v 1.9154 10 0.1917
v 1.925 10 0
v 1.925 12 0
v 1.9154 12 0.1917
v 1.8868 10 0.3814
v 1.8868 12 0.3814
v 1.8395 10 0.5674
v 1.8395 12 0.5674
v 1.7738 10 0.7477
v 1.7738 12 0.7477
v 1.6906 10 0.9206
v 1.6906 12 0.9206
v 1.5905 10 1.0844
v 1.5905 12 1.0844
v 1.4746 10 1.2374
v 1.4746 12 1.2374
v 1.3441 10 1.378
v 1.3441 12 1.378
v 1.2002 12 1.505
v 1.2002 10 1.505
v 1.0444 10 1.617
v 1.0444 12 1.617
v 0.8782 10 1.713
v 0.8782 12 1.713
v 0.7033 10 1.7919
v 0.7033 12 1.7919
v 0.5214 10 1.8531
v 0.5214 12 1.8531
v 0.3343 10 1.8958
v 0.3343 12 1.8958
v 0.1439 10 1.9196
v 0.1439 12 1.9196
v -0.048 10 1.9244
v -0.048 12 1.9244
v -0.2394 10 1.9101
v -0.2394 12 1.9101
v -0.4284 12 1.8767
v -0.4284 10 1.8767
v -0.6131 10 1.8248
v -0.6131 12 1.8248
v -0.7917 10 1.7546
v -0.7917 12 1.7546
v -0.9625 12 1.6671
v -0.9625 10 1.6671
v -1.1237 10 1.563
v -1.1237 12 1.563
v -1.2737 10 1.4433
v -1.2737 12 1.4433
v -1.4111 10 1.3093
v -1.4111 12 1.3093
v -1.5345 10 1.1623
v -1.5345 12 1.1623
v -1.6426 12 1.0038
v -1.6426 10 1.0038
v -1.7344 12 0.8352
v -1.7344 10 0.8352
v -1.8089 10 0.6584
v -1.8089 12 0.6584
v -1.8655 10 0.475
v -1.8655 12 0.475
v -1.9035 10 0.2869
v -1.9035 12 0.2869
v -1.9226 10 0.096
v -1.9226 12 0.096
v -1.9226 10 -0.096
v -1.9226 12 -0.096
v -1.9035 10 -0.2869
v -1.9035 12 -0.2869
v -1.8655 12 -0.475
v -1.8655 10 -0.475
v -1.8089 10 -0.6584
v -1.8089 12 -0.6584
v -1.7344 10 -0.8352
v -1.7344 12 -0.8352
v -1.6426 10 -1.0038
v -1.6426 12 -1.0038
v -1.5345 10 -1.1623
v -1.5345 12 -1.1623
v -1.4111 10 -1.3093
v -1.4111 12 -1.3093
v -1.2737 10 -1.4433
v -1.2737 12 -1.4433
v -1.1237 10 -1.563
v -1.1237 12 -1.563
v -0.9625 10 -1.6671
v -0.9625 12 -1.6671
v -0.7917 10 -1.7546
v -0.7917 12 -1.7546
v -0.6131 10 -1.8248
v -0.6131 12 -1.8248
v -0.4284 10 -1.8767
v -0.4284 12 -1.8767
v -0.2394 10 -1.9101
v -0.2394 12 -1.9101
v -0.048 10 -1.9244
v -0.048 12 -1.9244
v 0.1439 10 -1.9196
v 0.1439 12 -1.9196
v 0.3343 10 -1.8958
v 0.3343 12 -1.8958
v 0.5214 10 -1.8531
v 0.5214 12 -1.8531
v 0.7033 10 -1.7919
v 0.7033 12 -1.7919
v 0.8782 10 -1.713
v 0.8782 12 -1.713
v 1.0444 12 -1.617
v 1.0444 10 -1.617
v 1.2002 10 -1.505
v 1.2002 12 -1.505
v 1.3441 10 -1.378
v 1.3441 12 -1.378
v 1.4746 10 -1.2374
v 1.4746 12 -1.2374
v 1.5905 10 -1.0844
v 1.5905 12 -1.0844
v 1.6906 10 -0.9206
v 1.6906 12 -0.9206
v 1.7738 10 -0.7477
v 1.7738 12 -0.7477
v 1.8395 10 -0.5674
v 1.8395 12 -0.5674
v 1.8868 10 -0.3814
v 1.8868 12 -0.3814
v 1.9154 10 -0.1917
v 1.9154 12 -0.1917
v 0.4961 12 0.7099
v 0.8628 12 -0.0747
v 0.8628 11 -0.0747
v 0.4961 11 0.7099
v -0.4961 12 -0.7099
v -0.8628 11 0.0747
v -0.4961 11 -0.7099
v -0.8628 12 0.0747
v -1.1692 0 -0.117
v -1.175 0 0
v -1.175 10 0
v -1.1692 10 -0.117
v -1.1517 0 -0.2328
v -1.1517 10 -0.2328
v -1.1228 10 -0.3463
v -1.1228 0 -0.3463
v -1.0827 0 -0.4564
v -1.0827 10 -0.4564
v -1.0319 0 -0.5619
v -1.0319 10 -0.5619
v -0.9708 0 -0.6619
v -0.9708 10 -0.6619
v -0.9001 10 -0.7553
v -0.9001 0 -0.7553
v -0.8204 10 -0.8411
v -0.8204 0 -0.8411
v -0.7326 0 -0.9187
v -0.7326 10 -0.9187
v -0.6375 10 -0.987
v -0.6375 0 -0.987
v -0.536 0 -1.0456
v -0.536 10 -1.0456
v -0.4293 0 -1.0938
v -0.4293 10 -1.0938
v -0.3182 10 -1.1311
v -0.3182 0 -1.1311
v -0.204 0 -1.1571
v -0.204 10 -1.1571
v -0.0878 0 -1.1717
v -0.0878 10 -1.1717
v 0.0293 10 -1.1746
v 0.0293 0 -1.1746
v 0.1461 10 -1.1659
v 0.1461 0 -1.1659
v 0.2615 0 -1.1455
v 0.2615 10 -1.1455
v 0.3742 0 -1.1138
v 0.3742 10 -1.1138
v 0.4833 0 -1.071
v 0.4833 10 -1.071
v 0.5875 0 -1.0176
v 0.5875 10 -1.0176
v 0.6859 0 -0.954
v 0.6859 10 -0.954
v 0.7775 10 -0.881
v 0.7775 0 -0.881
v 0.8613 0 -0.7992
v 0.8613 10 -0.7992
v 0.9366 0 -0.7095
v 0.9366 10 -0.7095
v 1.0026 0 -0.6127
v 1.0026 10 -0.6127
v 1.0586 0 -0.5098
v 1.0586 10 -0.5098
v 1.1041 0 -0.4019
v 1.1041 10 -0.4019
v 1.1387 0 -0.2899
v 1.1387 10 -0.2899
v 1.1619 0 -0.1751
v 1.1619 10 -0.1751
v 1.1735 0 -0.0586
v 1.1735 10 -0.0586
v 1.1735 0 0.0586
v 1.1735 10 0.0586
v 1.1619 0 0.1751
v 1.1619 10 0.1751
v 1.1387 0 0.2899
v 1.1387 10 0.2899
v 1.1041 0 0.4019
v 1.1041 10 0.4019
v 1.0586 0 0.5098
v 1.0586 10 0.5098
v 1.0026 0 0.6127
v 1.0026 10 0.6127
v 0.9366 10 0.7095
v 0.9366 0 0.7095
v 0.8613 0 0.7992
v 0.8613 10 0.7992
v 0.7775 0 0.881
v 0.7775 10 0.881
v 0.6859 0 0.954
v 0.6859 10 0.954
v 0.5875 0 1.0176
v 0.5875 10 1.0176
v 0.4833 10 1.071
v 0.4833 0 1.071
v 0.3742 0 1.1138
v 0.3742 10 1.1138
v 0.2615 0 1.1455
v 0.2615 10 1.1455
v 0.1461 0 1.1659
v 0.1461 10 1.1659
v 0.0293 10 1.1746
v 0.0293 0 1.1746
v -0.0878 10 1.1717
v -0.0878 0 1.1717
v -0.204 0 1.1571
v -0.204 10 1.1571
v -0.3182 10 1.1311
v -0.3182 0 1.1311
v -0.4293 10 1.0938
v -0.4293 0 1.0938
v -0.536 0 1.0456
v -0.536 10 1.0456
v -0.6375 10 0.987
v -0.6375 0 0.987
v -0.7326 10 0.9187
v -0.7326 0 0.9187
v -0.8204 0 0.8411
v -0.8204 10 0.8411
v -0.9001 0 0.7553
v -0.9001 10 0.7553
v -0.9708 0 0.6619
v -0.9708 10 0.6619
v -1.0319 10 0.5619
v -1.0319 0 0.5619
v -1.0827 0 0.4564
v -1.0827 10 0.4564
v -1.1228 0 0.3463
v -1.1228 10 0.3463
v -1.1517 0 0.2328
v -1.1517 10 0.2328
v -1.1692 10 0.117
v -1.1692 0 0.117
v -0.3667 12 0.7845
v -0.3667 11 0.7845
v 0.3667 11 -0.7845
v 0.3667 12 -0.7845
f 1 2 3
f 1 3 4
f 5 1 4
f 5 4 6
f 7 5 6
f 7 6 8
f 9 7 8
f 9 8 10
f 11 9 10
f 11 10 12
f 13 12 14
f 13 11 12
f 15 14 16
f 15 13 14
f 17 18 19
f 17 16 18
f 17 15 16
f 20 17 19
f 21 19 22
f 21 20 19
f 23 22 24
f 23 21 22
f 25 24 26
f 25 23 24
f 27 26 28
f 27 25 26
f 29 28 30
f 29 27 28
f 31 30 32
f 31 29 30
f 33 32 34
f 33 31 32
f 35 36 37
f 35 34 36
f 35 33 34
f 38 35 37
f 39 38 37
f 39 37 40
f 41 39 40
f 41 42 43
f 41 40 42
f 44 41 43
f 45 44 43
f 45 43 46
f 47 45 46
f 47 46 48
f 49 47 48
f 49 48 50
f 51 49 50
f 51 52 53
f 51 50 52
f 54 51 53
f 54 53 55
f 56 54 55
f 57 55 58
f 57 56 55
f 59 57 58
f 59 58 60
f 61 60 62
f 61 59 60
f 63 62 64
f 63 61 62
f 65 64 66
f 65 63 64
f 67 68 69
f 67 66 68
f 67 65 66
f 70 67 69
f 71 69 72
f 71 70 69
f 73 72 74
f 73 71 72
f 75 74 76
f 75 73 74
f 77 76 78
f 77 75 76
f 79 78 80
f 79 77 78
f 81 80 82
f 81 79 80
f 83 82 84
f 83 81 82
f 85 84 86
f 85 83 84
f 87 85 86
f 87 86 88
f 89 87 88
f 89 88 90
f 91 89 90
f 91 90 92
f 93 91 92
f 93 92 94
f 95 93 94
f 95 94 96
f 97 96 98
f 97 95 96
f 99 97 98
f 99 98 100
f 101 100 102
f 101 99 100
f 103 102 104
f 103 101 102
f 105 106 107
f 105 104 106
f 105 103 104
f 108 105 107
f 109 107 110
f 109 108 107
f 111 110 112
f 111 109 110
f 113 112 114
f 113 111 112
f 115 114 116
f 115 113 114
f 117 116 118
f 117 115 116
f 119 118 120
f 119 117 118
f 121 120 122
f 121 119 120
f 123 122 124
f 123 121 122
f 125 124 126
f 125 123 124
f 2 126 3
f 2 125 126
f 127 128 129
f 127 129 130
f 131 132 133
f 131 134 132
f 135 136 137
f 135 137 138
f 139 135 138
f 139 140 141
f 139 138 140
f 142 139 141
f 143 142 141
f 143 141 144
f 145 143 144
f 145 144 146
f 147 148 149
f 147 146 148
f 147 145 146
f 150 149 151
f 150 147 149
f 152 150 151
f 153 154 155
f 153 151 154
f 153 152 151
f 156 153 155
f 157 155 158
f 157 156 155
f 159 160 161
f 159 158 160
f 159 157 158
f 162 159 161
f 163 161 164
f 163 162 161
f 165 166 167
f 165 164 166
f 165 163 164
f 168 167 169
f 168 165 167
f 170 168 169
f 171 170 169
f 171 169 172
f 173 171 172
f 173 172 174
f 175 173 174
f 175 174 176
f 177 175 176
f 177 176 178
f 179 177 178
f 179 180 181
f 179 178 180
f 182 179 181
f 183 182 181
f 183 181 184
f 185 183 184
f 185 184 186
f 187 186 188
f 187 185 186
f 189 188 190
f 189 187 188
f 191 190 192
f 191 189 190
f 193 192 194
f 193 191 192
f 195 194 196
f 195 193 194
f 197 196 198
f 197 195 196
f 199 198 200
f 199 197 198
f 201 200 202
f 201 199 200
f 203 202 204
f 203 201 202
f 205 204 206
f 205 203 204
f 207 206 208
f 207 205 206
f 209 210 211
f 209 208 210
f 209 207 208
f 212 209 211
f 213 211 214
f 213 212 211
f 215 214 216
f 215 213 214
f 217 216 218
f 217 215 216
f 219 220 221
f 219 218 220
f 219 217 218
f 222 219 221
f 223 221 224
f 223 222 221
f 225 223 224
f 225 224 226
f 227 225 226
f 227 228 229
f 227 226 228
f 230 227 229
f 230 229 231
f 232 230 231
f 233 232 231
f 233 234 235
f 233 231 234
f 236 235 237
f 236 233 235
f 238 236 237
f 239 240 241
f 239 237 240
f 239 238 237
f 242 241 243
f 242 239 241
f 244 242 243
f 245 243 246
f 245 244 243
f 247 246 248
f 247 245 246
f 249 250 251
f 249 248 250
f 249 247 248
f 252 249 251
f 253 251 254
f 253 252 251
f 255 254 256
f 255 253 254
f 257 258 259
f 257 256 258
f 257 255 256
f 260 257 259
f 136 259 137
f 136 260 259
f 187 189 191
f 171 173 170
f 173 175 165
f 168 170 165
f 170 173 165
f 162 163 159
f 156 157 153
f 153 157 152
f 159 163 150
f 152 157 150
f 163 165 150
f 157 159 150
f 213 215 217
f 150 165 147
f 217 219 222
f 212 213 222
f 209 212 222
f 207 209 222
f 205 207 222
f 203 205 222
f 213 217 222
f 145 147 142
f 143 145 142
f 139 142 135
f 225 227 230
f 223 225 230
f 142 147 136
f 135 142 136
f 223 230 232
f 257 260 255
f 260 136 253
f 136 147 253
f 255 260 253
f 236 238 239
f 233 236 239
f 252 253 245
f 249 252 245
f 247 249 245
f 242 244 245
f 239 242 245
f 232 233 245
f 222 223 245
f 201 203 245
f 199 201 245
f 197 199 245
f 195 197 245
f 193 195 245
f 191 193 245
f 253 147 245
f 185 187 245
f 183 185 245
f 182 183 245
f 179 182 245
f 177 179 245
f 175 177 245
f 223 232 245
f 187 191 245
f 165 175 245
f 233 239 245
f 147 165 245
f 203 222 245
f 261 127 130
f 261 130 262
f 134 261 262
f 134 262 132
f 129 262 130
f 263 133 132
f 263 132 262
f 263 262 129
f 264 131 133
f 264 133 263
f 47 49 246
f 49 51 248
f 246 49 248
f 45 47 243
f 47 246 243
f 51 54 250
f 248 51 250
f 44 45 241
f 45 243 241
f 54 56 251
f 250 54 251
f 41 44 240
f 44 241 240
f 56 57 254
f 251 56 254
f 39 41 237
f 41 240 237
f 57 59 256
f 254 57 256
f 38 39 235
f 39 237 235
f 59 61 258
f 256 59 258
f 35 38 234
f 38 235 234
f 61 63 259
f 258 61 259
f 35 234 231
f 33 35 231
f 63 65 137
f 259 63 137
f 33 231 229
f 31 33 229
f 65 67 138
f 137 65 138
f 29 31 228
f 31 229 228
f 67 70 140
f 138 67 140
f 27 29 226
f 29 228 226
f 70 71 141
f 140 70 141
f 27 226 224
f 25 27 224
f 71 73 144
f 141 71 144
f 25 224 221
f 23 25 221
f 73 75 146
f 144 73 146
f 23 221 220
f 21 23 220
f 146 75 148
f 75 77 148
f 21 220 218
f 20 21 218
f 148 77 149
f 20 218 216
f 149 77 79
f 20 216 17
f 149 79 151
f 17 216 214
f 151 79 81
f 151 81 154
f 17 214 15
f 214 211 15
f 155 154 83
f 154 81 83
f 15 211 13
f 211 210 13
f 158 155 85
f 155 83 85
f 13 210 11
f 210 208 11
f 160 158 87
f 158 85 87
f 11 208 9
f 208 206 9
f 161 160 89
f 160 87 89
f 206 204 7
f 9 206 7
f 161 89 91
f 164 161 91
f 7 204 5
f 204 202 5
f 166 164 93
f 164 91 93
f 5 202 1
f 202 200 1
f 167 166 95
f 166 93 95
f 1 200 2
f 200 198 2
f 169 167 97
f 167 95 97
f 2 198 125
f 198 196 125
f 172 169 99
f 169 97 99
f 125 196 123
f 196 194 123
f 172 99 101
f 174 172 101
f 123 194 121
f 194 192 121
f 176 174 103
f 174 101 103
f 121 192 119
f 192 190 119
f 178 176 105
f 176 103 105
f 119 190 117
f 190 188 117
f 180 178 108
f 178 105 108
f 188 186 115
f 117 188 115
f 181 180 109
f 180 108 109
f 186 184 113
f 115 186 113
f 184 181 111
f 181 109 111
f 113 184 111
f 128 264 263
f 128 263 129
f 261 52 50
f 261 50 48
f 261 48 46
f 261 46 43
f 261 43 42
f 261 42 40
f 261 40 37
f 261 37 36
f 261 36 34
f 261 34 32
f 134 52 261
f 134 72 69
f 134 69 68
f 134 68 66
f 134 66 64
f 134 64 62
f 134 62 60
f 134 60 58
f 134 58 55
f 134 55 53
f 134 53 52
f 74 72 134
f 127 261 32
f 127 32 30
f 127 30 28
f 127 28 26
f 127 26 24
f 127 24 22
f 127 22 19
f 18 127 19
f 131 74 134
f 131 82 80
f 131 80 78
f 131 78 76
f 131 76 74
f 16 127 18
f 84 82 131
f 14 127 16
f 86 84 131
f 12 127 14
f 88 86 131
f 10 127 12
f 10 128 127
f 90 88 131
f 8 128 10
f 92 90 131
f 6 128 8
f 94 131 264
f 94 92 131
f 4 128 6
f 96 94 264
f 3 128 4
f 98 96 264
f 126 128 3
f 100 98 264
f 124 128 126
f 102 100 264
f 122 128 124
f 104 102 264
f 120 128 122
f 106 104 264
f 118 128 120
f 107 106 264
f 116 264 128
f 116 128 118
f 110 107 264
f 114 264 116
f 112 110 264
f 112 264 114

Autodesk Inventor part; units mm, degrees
ref_plane "YZ Plane" through (0, 0, 0) normal (1, 0, 0) x (0, 1, 0)
ref_plane "XZ Plane" through (0, 0, 0) normal (0, 1, 0) x (-1, 0, 0)
ref_plane "XY Plane" through (0, 0, 0) normal (0, 0, 1) x (1, 0, 0)
sketch "Sketch1" plane through (0, 0, 0) normal (0, 1, 0) x (-1, 0, 0)
  circle A0 centre (0, 0) radius 1.175
  dimension "d0" = 2.35
extrude "Extrusion1" add sketch "Sketch1" along normal blind 10
sketch "Sketch2" plane through (0, 10, 0) normal (0, 1, 0) x (1, 0, 0)
  circle A0 centre (0, 0) radius 1.175 projected
  circle A1 centre (0, 0) radius 1.925
  dimension "d3" = 3.85
extrude "Extrusion2" add sketch "Sketch2" along normal blind 2 contours A0 | A1
sketch "Sketch3" plane through (0, 12, 0) normal (0, 1, 0) x (1, 0, 0)
  line L0 (-0.4961, 0.7099) -> (0.3667, 0.7845)
  line L1 (0.3667, 0.7845) -> (0.8628, 0.0747)
  line L2 (0.8628, 0.0747) -> (0.4961, -0.7099)
  line L3 (0.4961, -0.7099) -> (-0.3667, -0.7845)
  line L4 (-0.3667, -0.7845) -> (-0.8628, -0.0747)
  line L5 (-0.8628, -0.0747) -> (-0.4961, 0.7099)
  point P0 (0, 0)
  point P1 (0, 0)
  dimension "d6" = 1.5
extrude "Extrusion3" cut sketch "Sketch3" against normal blind 1
equation "\"d0\" = M2_A"
equation "\"d3\" = M2_B"
equation "\"M2_A\" = 2.35"
equation "\"M2_B\" = 3.85"
properties part number "M2_SCREW_8MM"
